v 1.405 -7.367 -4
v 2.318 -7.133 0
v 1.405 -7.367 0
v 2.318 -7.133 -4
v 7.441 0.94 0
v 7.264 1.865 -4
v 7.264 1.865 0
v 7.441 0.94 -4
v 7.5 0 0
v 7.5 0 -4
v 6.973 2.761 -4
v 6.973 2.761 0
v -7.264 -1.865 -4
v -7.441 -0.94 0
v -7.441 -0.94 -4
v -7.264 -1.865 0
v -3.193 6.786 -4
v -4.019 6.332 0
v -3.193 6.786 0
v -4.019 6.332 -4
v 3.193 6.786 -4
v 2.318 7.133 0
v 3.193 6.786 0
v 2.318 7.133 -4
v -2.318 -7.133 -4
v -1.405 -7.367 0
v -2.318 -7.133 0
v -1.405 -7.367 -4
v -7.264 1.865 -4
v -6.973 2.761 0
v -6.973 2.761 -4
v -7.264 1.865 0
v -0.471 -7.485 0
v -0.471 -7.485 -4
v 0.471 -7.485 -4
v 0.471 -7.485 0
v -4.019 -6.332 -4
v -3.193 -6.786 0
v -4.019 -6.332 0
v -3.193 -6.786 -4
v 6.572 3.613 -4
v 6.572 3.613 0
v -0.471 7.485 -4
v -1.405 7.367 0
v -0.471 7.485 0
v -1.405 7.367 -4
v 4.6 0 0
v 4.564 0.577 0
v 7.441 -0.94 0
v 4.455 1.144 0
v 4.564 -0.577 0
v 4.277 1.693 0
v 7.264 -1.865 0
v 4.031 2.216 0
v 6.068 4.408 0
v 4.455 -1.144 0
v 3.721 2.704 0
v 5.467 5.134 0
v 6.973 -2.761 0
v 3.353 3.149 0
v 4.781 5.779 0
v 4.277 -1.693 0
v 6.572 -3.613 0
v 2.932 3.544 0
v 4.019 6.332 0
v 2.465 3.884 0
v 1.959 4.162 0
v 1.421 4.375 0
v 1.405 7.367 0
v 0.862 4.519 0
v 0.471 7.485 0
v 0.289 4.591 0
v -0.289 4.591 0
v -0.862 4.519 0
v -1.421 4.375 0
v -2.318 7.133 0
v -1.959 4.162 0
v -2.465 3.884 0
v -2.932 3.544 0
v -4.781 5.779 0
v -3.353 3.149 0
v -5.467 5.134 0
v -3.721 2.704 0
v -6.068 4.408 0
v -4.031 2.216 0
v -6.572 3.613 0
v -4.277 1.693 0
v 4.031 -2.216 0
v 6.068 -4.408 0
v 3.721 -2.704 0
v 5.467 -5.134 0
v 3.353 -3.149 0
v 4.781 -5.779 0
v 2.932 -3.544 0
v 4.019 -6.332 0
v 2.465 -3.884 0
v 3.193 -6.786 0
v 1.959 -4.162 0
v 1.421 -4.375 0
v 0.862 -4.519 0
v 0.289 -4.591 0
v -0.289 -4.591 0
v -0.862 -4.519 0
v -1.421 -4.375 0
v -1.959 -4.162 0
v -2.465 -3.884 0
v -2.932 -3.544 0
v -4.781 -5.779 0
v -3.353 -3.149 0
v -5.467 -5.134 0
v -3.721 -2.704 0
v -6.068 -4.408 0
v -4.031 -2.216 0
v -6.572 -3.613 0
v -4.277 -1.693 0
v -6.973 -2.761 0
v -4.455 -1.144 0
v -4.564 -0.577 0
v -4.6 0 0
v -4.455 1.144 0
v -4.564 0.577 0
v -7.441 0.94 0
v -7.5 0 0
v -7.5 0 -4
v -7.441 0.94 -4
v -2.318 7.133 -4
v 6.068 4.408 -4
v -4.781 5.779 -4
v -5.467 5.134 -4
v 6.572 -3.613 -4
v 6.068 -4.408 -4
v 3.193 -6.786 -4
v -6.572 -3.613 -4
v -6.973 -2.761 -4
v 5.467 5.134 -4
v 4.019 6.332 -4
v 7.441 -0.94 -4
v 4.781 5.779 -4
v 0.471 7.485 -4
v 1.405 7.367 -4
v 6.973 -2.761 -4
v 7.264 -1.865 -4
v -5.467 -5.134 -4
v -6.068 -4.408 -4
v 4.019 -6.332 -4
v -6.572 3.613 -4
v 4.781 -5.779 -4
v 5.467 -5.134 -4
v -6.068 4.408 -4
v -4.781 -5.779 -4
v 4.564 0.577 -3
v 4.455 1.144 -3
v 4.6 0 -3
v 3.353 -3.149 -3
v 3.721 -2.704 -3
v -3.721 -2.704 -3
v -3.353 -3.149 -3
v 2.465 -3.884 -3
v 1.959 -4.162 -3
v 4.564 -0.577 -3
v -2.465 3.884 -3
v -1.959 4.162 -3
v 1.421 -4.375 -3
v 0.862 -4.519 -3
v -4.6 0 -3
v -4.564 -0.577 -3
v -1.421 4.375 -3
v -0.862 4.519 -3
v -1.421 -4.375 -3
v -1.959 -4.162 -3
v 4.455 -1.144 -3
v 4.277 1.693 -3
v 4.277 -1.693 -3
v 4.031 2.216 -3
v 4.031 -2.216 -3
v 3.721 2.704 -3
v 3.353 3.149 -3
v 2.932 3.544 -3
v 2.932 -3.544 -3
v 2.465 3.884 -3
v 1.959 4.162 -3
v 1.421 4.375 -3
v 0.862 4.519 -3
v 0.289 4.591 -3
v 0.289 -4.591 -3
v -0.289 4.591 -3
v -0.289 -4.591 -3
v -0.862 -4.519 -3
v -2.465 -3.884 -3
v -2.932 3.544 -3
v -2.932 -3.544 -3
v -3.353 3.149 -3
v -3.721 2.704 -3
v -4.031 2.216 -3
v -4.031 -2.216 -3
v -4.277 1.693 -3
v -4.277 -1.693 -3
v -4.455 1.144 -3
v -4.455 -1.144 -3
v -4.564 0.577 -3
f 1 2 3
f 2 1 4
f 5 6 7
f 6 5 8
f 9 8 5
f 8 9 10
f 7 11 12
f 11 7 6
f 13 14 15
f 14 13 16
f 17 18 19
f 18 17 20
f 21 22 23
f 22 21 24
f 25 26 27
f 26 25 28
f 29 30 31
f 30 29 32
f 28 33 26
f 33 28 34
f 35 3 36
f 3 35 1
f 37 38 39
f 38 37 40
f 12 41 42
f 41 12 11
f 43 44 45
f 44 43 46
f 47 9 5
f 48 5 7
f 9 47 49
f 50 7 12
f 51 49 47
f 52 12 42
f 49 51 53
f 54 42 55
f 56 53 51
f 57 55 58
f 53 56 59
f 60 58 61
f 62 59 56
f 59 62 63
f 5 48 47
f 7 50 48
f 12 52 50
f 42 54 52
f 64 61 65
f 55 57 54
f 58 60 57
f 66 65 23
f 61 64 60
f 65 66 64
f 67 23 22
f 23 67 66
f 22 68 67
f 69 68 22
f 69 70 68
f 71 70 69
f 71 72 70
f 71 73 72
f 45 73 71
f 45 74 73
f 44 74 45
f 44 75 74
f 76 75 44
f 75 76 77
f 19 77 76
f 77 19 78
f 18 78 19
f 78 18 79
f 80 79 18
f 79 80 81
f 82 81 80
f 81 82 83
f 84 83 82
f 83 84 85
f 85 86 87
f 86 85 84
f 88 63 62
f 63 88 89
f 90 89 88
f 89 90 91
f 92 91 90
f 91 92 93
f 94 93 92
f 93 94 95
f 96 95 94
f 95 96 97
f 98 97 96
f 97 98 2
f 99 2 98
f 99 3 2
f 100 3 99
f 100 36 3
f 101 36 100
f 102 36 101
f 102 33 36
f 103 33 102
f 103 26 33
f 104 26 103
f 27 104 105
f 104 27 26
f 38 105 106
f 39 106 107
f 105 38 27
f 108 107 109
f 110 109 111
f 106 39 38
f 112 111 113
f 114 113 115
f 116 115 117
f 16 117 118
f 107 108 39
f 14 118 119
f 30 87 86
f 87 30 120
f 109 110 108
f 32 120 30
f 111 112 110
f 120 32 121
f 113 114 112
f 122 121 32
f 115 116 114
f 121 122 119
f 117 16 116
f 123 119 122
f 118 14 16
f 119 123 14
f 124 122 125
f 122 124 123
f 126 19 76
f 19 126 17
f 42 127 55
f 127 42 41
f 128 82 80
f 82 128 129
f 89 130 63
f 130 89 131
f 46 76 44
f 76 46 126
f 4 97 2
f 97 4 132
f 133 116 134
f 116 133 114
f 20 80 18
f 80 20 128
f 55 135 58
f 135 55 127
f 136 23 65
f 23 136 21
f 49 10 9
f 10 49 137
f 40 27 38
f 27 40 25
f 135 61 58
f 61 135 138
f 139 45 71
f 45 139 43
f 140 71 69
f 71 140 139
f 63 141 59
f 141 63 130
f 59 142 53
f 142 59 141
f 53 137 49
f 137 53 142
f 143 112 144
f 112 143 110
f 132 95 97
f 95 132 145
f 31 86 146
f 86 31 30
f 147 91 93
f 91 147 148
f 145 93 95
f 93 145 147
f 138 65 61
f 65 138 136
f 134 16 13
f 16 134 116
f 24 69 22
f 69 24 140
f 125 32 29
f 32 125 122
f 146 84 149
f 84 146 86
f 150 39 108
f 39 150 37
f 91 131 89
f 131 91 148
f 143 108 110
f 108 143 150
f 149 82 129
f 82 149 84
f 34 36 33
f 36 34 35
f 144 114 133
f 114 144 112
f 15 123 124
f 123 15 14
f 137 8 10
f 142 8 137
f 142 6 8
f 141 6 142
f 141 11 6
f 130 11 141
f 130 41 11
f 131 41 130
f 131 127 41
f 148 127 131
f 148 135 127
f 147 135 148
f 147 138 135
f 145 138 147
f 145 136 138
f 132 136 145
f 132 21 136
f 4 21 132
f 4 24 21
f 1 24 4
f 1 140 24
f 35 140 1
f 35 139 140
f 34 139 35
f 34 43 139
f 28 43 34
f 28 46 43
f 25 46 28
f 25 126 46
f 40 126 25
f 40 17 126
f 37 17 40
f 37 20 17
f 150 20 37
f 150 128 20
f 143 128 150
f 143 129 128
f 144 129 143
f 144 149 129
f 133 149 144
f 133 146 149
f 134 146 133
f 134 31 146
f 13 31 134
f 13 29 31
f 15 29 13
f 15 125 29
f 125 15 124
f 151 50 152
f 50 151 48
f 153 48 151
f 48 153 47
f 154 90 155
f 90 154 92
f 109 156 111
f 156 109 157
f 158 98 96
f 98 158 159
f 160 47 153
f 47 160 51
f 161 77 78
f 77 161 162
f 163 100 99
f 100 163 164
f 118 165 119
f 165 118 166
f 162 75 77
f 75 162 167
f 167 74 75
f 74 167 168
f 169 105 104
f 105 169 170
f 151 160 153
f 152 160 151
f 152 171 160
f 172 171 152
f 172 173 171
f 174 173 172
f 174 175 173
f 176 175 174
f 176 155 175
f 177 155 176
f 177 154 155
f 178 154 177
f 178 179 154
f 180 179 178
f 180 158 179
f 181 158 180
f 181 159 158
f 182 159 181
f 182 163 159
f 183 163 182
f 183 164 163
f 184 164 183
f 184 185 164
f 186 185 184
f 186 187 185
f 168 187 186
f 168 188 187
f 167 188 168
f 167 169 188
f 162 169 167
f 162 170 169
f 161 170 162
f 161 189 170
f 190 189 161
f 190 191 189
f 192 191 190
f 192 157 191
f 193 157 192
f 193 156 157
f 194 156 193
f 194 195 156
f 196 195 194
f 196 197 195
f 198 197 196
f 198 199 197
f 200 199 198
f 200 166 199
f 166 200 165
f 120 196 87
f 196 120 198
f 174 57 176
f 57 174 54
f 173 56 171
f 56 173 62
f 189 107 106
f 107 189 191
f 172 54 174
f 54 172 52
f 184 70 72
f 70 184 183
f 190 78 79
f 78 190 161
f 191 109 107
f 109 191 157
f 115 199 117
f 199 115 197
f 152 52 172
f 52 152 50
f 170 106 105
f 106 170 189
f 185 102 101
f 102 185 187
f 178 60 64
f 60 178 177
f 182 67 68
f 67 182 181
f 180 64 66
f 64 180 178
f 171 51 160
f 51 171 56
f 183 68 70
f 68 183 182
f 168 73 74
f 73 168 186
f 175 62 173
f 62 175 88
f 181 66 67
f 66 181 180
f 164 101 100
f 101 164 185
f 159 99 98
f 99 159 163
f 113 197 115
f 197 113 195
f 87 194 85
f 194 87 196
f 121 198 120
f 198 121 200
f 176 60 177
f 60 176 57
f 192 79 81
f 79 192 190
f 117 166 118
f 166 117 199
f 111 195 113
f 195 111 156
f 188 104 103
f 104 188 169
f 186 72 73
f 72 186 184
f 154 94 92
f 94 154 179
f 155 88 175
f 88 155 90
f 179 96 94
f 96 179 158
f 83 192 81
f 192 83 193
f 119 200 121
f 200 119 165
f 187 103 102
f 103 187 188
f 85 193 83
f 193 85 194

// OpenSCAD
$fn = 50;


difference() {
	union() {
		translate(v = [0, 0, -4.0000000000]) {
			cylinder(h = 4, r = 7.5000000000);
		}
	}
	union() {
		#translate(v = [0, 0, -3.0000000000]) {
			cylinder(h = 3, r = 4.6000000000);
		}
	}
}
